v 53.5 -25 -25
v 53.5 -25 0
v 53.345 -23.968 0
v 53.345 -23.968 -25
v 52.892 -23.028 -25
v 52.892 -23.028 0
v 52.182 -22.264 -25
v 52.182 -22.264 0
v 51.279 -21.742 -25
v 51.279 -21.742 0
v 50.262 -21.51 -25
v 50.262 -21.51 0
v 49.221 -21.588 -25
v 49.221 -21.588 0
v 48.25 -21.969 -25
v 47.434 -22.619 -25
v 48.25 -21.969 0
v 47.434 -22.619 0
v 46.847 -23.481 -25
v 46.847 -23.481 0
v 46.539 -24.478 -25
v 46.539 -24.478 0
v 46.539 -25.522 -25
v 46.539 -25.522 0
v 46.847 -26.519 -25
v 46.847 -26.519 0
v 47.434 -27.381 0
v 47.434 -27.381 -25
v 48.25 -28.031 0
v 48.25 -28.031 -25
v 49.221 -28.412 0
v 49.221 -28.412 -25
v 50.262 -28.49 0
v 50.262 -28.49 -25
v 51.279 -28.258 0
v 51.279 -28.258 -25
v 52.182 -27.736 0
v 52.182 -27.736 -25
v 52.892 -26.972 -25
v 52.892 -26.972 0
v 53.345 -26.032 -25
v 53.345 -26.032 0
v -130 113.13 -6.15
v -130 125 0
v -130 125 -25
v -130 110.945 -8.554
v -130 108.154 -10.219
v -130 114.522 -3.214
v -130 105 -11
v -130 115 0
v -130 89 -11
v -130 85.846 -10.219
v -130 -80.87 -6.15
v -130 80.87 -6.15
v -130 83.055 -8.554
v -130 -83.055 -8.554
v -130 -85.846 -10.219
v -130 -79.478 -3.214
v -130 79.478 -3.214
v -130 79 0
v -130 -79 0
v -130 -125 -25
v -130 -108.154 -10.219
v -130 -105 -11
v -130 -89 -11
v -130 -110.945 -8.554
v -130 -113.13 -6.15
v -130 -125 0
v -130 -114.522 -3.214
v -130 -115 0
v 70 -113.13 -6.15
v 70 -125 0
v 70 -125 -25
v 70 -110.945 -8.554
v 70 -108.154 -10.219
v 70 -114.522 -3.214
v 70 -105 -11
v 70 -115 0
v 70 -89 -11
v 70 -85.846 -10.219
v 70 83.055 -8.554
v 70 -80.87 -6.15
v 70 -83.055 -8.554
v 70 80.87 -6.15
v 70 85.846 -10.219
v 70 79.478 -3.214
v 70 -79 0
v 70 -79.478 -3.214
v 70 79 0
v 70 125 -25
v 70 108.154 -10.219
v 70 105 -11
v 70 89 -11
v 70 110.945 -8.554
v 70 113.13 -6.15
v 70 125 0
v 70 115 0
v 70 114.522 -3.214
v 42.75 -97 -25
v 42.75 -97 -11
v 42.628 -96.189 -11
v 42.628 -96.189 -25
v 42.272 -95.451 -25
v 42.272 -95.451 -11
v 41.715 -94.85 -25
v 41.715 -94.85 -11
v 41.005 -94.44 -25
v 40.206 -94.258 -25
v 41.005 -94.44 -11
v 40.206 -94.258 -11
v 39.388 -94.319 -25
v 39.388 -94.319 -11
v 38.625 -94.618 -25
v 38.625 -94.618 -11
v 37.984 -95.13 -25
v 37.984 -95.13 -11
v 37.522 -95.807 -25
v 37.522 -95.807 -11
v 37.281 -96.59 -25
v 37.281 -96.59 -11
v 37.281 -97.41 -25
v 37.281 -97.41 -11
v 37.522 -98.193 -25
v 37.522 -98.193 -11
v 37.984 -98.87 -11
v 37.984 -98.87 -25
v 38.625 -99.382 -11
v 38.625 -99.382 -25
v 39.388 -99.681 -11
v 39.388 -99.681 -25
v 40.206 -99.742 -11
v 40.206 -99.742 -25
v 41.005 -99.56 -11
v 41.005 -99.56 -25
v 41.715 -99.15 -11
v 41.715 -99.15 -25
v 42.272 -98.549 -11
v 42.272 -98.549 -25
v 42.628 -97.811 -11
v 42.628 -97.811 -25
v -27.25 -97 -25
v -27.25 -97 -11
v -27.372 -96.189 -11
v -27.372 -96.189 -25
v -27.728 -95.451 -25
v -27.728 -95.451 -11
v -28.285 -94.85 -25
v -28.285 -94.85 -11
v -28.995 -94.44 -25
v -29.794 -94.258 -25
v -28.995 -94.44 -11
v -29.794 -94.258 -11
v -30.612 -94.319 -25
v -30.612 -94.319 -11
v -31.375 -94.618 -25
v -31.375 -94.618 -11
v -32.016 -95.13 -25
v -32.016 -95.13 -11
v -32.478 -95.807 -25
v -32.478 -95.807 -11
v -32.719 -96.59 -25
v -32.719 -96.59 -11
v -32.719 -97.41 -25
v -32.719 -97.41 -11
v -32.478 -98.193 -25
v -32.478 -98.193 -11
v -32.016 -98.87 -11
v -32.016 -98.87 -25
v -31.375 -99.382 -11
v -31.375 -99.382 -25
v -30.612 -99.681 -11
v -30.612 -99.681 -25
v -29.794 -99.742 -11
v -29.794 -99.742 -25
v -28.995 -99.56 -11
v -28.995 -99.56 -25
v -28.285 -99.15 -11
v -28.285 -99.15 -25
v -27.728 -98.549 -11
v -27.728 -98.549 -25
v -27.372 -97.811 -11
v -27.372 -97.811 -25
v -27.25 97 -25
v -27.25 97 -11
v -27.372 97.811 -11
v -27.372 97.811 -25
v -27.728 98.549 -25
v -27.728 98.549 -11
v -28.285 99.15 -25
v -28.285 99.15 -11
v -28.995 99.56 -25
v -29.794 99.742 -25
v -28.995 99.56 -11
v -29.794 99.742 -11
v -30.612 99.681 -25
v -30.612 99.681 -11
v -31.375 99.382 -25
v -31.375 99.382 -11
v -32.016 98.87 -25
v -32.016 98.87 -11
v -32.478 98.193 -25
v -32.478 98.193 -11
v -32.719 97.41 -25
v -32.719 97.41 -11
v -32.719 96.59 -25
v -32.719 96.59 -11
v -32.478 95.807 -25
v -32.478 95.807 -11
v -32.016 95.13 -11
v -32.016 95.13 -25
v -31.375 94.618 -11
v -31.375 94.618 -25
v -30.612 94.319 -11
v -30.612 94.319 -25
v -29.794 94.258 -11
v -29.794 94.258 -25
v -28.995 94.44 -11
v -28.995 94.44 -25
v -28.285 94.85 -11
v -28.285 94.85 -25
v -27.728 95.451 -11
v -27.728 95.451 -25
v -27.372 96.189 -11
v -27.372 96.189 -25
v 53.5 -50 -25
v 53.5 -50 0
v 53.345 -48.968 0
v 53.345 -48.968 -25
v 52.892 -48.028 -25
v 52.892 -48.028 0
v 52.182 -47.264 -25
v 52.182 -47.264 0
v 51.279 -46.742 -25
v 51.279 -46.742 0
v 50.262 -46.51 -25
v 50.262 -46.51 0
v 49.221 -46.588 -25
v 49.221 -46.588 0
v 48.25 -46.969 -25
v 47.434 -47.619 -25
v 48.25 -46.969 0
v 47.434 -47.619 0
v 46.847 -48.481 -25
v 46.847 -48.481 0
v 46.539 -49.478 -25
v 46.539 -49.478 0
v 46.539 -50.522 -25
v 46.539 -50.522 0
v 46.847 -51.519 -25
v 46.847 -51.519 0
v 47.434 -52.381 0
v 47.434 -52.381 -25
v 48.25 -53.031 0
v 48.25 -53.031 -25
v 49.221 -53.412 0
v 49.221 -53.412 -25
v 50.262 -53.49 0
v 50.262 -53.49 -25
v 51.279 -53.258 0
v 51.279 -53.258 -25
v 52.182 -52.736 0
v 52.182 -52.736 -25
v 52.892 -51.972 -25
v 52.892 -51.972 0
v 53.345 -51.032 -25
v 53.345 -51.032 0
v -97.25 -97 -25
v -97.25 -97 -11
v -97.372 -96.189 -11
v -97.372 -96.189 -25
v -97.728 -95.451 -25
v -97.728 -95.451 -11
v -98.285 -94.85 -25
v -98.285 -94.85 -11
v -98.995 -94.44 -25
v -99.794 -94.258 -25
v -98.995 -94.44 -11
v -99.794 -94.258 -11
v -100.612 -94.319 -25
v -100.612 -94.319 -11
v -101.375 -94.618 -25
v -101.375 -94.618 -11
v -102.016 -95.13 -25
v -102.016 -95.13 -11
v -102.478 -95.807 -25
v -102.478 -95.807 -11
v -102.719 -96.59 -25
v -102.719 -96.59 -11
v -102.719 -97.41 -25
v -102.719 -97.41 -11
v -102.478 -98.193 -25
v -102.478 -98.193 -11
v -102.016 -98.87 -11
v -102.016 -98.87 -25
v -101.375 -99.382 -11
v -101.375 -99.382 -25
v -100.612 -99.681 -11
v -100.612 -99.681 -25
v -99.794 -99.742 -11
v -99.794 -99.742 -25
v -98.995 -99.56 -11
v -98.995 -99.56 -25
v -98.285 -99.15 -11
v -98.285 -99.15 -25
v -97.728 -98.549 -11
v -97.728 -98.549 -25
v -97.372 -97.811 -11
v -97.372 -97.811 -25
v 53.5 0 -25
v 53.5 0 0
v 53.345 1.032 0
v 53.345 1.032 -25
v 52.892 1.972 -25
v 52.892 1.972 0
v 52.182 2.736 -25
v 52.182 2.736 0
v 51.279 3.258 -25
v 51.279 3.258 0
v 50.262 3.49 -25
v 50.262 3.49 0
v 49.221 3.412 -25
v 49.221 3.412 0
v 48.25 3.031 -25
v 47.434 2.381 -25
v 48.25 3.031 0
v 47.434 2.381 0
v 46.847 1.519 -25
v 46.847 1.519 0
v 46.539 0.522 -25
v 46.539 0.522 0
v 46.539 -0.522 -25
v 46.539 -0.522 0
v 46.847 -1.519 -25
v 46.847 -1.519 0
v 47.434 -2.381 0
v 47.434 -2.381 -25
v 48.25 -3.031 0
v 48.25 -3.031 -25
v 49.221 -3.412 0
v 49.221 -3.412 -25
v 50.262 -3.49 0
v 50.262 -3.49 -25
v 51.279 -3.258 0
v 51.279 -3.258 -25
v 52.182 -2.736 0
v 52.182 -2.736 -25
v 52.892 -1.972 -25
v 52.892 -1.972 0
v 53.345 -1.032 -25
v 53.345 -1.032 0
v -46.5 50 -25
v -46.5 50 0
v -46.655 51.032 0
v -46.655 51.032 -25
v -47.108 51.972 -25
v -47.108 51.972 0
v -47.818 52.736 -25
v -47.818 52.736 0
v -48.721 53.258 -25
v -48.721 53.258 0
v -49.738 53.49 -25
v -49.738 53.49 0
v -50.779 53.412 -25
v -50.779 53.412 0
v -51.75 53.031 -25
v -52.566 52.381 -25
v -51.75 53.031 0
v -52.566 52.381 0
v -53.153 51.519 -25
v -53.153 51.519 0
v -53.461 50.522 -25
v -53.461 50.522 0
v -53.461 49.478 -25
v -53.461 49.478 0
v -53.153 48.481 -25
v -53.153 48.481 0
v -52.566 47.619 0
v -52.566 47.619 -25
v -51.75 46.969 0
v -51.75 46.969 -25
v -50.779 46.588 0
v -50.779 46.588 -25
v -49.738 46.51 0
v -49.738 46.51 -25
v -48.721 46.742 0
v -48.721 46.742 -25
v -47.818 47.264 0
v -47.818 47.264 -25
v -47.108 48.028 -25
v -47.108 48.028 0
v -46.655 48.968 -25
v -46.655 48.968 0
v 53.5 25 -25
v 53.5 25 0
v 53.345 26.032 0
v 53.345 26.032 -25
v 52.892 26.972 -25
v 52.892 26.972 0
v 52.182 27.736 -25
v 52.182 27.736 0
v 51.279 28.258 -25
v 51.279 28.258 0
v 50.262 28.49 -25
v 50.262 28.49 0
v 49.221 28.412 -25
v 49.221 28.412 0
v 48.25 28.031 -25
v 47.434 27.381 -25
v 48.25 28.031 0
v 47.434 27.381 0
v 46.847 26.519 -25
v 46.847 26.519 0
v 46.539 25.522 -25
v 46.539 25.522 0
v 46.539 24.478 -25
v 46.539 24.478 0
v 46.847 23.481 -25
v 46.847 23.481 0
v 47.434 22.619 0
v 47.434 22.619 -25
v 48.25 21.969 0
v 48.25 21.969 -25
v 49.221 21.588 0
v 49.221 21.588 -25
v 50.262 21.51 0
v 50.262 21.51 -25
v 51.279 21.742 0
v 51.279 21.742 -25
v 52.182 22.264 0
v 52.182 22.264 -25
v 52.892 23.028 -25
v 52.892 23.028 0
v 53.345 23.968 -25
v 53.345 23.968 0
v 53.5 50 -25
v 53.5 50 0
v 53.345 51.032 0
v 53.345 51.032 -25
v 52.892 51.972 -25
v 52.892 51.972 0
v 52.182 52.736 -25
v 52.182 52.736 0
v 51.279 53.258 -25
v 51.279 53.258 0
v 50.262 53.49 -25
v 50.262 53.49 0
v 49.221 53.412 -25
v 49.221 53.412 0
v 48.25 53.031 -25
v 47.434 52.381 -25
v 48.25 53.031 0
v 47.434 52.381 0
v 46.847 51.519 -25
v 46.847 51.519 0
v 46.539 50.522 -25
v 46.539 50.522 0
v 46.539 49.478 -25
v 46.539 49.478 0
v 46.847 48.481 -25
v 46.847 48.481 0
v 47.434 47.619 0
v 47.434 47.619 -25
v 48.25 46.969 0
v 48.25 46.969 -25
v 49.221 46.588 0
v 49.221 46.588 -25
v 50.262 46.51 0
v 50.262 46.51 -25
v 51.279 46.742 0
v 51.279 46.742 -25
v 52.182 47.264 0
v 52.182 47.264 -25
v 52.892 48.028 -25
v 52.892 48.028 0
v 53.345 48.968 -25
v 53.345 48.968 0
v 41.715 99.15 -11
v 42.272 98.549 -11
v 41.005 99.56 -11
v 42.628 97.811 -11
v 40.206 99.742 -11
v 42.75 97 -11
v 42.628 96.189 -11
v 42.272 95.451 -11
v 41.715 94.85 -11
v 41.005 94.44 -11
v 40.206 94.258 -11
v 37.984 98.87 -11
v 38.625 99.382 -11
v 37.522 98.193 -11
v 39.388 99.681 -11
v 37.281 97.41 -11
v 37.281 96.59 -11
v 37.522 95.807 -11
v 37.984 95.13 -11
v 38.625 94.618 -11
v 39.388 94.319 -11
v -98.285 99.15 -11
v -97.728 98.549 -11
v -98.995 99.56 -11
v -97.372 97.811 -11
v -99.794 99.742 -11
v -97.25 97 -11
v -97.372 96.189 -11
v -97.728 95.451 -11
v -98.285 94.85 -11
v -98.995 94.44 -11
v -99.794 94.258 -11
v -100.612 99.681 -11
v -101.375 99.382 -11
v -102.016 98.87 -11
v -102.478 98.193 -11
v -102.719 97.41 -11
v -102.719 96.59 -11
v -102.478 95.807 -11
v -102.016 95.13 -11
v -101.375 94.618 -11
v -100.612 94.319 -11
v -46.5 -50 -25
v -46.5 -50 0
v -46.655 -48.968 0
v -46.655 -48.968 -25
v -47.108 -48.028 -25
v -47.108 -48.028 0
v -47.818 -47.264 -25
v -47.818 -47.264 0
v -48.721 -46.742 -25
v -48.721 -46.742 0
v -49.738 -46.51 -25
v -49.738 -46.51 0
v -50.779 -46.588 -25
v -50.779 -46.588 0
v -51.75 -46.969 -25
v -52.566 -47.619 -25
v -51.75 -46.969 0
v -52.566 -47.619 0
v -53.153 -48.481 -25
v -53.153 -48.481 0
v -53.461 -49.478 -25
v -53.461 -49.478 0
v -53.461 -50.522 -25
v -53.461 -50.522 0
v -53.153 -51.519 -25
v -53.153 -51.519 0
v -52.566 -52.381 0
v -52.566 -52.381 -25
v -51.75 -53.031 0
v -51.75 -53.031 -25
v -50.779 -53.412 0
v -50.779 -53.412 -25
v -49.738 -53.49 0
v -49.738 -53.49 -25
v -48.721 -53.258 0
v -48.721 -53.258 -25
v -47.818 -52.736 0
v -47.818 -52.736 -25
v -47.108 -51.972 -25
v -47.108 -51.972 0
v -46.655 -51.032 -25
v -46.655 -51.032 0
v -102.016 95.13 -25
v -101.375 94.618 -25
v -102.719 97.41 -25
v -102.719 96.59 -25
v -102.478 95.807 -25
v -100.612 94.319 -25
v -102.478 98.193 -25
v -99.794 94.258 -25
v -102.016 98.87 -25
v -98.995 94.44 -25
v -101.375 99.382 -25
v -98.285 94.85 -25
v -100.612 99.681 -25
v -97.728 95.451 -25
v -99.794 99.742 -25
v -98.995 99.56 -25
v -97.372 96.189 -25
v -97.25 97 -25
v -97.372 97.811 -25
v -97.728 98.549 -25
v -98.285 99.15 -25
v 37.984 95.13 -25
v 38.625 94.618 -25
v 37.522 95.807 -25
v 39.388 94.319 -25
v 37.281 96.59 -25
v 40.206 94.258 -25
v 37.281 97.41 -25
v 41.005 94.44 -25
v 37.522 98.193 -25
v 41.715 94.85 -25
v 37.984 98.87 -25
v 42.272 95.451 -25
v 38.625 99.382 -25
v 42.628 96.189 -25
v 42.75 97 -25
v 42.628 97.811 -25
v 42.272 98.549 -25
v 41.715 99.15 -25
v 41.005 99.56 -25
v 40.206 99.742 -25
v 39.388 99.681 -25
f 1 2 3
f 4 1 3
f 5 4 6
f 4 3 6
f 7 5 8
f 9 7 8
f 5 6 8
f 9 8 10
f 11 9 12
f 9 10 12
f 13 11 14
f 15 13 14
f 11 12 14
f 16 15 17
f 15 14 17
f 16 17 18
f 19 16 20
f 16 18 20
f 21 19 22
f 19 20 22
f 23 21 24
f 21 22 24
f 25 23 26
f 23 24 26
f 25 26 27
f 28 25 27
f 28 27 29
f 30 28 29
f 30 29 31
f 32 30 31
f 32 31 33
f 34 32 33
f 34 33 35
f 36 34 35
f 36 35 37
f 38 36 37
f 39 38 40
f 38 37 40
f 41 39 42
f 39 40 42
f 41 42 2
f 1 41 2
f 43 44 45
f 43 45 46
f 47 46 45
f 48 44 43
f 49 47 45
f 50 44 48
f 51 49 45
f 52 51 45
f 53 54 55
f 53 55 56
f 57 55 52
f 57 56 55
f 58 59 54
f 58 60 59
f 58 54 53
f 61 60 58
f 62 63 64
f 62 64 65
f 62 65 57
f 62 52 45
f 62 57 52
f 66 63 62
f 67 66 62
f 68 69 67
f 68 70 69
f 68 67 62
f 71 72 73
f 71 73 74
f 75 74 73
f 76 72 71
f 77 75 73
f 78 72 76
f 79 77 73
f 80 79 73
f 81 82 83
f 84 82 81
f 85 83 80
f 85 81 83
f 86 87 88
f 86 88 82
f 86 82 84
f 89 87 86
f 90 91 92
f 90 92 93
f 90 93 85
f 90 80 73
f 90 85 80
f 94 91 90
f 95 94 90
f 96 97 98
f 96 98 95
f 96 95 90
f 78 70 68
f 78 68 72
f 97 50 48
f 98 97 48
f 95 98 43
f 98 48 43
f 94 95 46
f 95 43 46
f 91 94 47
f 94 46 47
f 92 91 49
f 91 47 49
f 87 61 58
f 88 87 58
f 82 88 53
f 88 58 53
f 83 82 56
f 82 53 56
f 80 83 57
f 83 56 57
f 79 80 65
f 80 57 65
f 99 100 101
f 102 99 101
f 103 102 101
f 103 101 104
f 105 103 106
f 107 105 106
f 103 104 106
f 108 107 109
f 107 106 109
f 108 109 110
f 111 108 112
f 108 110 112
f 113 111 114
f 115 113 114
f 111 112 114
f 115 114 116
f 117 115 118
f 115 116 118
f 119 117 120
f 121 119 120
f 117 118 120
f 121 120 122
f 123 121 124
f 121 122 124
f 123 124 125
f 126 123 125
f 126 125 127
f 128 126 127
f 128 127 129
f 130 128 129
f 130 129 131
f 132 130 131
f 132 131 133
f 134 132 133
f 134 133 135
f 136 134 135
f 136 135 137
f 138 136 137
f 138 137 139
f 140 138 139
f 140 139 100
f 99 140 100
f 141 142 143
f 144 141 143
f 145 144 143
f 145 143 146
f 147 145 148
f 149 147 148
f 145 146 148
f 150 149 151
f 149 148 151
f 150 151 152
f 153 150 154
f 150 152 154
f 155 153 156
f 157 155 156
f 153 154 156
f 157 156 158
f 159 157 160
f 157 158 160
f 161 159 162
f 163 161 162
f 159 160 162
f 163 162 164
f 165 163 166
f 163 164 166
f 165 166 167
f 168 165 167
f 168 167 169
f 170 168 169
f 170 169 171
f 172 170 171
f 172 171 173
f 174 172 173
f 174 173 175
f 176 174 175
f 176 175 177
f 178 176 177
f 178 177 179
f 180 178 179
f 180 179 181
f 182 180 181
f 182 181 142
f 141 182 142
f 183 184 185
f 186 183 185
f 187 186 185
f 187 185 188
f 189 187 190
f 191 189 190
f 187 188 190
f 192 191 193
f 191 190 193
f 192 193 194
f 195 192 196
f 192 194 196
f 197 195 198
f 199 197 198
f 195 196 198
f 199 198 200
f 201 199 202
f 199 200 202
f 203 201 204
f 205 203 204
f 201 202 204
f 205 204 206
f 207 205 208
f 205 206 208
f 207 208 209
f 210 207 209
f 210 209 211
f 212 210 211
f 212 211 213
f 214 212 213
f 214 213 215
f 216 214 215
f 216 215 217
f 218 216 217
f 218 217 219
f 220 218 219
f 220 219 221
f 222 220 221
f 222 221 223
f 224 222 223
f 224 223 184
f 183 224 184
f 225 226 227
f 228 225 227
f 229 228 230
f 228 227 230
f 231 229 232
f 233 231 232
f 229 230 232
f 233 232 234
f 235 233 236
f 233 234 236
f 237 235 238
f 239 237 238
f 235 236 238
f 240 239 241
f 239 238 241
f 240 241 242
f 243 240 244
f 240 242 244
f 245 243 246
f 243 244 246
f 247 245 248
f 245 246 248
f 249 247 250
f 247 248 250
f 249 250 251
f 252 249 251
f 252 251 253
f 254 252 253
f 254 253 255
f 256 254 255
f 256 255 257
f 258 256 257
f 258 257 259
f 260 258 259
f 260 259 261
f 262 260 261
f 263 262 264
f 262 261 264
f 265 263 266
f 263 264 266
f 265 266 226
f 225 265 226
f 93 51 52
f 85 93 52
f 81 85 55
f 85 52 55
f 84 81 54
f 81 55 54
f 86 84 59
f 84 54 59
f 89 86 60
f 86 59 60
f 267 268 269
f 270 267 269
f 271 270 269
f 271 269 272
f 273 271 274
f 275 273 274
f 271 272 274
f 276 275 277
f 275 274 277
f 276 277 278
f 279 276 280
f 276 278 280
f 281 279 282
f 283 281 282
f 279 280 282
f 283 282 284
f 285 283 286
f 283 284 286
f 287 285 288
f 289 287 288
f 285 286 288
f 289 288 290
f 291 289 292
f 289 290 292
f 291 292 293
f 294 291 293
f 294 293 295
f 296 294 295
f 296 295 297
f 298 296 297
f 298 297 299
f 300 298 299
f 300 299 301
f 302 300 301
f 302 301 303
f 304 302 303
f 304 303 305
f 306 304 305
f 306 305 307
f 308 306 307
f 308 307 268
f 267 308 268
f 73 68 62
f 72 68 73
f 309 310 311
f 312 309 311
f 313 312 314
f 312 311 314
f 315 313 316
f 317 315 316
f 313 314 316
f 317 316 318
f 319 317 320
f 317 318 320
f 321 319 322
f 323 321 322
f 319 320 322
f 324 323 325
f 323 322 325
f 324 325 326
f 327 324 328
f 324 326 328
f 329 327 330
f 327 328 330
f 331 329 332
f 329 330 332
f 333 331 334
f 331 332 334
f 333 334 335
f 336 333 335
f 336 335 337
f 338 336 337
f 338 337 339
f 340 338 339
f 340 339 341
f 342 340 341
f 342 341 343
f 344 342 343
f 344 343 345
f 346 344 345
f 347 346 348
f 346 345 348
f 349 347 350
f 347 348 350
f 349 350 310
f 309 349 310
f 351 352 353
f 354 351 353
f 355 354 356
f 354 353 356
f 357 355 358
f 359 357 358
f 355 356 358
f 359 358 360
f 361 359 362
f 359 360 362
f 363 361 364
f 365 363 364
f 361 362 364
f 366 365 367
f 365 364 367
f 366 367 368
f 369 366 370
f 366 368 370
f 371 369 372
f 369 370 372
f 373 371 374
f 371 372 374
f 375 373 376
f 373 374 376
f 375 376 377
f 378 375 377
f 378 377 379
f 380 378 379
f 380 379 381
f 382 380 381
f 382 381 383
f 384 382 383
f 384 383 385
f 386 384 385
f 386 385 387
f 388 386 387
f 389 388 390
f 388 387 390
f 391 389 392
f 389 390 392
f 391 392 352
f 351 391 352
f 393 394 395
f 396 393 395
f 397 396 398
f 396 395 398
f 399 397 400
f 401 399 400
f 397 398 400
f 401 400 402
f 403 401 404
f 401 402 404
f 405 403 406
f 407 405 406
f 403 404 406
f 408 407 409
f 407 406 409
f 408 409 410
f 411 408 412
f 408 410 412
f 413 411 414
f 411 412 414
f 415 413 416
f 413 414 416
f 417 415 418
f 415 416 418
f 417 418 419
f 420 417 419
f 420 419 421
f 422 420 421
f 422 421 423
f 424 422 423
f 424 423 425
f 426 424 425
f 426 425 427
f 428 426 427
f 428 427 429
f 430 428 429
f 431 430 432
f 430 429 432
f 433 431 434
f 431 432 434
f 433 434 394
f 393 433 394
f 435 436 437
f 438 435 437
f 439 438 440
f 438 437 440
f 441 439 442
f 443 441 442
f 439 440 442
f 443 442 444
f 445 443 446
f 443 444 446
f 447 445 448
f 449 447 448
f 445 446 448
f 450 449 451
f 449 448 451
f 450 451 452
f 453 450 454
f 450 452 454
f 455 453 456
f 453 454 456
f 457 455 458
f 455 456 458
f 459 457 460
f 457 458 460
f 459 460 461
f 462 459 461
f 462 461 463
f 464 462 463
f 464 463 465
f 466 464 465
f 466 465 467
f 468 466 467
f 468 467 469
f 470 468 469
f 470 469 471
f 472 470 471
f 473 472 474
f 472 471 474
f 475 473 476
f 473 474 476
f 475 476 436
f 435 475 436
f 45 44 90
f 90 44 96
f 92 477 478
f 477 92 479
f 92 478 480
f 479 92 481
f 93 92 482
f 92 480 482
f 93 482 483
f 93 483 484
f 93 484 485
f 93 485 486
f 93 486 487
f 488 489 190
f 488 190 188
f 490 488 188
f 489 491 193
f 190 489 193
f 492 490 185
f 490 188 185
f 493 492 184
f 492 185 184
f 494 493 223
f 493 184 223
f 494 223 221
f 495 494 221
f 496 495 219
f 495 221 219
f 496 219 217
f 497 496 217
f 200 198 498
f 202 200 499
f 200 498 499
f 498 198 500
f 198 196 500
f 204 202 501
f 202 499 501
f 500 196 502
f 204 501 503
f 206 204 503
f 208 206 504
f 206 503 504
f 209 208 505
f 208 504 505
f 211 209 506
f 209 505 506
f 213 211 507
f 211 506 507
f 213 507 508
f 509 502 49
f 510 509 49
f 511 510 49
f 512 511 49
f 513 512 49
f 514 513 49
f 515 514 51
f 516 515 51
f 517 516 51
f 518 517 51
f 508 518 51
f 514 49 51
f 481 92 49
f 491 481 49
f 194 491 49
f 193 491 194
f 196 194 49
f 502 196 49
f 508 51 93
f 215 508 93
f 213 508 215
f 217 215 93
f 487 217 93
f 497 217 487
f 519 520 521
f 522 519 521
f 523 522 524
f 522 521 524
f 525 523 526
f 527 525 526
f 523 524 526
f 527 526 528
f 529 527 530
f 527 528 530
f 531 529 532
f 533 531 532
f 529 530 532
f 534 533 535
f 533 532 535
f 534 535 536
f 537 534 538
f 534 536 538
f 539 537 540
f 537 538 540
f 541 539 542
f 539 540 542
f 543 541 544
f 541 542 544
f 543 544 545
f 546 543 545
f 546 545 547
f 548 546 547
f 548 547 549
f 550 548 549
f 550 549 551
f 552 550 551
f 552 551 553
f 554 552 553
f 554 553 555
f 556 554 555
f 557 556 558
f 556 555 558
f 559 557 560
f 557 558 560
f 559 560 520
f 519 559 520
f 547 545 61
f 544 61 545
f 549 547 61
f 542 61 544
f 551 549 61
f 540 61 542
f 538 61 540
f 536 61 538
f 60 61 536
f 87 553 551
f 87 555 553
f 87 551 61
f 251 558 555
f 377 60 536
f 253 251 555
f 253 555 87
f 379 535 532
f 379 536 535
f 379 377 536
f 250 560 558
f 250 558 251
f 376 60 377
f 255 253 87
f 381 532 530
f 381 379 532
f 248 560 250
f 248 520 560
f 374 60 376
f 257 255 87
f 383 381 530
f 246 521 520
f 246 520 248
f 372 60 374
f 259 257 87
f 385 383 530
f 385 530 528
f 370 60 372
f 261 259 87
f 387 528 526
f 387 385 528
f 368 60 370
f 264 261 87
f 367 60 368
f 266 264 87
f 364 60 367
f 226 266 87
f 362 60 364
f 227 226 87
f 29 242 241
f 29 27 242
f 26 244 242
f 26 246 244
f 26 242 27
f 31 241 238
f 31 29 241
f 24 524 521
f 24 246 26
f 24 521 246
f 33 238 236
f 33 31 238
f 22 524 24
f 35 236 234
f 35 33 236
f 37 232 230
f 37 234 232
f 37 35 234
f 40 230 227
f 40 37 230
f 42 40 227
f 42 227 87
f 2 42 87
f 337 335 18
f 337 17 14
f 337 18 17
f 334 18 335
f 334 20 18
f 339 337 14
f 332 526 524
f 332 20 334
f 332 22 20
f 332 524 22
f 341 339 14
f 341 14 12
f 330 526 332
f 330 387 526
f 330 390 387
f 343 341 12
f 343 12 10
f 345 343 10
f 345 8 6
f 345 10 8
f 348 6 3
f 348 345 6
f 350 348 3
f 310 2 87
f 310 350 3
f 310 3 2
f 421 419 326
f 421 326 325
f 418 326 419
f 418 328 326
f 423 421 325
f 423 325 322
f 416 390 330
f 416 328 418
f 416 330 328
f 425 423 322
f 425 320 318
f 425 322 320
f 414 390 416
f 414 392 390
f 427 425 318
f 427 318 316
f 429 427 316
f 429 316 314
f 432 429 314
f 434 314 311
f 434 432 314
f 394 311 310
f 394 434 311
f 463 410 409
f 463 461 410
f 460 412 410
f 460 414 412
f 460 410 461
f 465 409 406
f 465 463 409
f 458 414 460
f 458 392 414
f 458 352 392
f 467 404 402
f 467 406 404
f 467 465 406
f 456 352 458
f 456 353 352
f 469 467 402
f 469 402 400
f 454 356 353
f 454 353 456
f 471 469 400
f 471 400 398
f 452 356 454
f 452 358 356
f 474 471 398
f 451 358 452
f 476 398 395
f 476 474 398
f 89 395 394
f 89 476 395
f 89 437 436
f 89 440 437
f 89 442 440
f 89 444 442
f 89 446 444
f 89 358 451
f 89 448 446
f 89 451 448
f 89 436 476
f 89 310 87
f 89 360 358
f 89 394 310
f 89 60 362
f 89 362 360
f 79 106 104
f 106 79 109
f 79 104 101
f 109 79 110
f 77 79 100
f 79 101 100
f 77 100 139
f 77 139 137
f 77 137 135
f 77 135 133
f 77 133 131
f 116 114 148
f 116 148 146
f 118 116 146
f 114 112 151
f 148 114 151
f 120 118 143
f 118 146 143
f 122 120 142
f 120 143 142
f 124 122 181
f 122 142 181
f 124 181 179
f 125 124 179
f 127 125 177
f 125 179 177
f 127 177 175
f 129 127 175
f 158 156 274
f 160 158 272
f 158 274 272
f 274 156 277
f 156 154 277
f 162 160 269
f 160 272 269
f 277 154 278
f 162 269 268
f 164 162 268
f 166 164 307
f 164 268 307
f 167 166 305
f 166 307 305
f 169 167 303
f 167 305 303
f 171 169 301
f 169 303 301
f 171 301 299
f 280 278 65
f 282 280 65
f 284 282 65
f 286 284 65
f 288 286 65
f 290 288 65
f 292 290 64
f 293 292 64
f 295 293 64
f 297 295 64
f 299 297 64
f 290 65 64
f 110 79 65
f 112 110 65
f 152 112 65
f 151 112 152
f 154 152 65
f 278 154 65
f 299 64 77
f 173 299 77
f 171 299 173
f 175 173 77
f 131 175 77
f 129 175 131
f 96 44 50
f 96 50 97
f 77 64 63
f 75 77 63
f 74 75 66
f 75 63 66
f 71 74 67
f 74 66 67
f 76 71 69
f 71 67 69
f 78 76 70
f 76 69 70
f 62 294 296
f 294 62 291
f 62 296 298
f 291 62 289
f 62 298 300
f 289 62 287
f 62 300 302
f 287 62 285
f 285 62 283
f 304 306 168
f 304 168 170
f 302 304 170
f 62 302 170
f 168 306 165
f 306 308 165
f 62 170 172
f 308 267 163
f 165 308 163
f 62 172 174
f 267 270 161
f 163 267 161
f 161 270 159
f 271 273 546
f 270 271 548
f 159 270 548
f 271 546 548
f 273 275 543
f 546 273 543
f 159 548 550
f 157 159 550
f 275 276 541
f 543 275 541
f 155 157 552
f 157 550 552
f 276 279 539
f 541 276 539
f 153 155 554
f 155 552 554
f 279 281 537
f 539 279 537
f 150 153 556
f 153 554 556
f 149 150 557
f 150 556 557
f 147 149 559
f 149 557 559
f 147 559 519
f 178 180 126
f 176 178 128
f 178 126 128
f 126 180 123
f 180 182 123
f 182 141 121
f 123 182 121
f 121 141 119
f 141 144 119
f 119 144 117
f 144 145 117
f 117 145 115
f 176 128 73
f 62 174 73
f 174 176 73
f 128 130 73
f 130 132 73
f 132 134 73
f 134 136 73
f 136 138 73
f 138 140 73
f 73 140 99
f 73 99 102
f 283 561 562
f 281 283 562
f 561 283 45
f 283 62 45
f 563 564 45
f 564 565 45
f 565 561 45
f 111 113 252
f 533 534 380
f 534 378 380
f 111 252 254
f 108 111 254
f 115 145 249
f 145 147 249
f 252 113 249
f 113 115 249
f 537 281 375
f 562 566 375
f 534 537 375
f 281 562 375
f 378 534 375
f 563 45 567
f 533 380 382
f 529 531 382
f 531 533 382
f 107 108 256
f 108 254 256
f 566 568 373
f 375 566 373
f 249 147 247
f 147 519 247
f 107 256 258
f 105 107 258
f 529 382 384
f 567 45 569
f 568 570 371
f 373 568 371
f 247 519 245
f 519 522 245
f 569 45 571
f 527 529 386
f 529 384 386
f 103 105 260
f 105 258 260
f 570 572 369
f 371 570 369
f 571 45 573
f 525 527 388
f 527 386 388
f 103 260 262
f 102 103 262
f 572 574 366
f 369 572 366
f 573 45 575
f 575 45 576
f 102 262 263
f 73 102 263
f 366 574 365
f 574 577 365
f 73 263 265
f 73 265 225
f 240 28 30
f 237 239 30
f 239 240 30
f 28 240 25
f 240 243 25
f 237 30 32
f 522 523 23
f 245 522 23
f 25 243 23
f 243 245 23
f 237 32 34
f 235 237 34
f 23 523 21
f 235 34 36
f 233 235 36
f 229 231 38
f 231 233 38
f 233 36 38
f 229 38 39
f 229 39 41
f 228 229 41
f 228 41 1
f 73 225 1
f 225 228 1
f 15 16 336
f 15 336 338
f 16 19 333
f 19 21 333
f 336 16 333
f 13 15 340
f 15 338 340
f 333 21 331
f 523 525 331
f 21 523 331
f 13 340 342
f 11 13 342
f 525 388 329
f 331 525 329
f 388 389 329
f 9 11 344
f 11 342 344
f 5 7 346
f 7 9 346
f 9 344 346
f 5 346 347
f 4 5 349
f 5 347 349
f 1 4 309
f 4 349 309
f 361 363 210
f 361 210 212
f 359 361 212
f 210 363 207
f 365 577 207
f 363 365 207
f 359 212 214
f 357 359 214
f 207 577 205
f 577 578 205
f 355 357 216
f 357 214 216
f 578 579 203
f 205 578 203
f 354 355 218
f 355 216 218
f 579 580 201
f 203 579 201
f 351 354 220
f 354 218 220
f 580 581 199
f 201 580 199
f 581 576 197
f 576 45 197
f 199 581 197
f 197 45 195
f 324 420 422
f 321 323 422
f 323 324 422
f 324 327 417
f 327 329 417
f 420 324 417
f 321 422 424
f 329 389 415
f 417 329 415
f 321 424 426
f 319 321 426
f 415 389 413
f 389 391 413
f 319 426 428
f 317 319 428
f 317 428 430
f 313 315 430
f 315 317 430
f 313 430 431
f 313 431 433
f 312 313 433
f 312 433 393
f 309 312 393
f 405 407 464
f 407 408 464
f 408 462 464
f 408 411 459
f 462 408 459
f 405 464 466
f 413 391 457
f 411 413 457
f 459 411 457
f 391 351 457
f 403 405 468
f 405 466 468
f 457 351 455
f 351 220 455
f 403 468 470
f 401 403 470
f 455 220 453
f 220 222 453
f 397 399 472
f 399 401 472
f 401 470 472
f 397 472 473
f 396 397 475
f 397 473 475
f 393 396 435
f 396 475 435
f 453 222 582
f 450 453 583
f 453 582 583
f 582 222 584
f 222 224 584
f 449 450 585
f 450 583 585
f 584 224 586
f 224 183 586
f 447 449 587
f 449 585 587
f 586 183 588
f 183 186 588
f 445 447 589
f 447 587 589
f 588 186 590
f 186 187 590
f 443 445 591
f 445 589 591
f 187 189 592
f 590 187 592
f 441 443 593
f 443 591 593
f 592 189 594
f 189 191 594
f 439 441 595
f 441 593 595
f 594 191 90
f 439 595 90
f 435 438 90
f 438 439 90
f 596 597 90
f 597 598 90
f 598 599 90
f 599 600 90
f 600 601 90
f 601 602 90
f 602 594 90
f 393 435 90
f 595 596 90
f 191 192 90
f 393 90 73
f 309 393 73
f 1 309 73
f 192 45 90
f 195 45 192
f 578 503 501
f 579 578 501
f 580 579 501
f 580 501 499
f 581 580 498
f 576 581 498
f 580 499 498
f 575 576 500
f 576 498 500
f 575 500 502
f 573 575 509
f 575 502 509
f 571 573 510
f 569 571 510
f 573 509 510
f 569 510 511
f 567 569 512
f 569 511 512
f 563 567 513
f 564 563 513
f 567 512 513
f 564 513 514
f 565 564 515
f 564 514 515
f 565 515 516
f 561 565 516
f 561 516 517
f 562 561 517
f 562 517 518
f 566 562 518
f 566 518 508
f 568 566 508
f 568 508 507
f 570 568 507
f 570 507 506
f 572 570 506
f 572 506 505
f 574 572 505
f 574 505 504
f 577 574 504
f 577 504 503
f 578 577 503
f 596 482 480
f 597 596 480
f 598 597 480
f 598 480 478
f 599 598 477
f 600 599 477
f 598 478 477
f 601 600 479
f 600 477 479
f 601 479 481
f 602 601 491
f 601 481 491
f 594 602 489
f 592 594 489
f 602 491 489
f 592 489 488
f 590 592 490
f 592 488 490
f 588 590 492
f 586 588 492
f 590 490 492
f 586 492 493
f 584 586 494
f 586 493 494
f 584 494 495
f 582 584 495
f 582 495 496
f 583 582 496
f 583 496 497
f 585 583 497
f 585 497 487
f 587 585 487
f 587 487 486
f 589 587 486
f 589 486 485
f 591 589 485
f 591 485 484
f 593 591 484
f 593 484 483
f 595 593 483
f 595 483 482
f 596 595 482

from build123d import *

# Parameters (mm, degrees)
F0_W     = 200
F0_H     = 10
F0_H_2   = 36
F0_R     = 2.75
F0_H_3   = 158
F0_R_2   = 3.5
F1_DEPTH = 25
F3_DEPTH = 200.001


with BuildPart() as f1:
    # F0 (on Top) → F1 (new body)
    with BuildSketch(Plane.XY):
        with Locations((-30, 120)):
            Rectangle(F0_W, F0_H)
        with Locations((-30, 97)):
            Rectangle(F0_W, F0_H_2)
        with Locations((-100, 97)):
            Circle(F0_R, mode=Mode.SUBTRACT)
        with Locations((-30, 97)):
            Circle(F0_R, mode=Mode.SUBTRACT)
        with Locations((40, 97)):
            Circle(F0_R, mode=Mode.SUBTRACT)
        with Locations((-30, 0)):
            Rectangle(F0_W, F0_H_3)
        with Locations((-50, -50)):
            Circle(F0_R_2, mode=Mode.SUBTRACT)
        with Locations((50, -50)):
            Circle(F0_R_2, mode=Mode.SUBTRACT)
        with Locations((50, -25)):
            Circle(F0_R_2, mode=Mode.SUBTRACT)
        with Locations((-50, 50)):
            Circle(F0_R_2, mode=Mode.SUBTRACT)
        with Locations((50, 0)):
            Circle(F0_R_2, mode=Mode.SUBTRACT)
        with Locations((50, 25)):
            Circle(F0_R_2, mode=Mode.SUBTRACT)
        with Locations((50, 50)):
            Circle(F0_R_2, mode=Mode.SUBTRACT)
        with Locations((-30, -97)):
            Rectangle(F0_W, F0_H_2)
        with Locations((-100, -97)):
            Circle(F0_R, mode=Mode.SUBTRACT)
        with Locations((-30, -97)):
            Circle(F0_R, mode=Mode.SUBTRACT)
        with Locations((40, -97)):
            Circle(F0_R, mode=Mode.SUBTRACT)
        with Locations((-30, -120)):
            Rectangle(F0_W, F0_H)
    extrude(amount=-F1_DEPTH)

    # F2 (on face) → F3 (cut, through all)
    with BuildSketch(Plane(origin=(-130, 0, 0), x_dir=(0, -1, 0), z_dir=(-1, 0, 0))):
        with BuildLine():
            Line((-79, 0), (-115, 0))
            ThreePointArc((-115, 0), (-112.126338, -7.433034), (-105, -11))
            Line((-105, -11), (-89, -11))
            ThreePointArc((-89, -11), (-81.873662, -7.433034), (-79, 0))
        make_face()
        with BuildLine():
            Line((115, 0), (79, 0))
            ThreePointArc((79, 0), (81.873662, -7.433034), (89, -11))
            Line((89, -11), (105, -11))
            ThreePointArc((105, -11), (112.126338, -7.433034), (115, 0))
        make_face()
    extrude(amount=-F3_DEPTH, mode=Mode.SUBTRACT)


solid = f1.part
